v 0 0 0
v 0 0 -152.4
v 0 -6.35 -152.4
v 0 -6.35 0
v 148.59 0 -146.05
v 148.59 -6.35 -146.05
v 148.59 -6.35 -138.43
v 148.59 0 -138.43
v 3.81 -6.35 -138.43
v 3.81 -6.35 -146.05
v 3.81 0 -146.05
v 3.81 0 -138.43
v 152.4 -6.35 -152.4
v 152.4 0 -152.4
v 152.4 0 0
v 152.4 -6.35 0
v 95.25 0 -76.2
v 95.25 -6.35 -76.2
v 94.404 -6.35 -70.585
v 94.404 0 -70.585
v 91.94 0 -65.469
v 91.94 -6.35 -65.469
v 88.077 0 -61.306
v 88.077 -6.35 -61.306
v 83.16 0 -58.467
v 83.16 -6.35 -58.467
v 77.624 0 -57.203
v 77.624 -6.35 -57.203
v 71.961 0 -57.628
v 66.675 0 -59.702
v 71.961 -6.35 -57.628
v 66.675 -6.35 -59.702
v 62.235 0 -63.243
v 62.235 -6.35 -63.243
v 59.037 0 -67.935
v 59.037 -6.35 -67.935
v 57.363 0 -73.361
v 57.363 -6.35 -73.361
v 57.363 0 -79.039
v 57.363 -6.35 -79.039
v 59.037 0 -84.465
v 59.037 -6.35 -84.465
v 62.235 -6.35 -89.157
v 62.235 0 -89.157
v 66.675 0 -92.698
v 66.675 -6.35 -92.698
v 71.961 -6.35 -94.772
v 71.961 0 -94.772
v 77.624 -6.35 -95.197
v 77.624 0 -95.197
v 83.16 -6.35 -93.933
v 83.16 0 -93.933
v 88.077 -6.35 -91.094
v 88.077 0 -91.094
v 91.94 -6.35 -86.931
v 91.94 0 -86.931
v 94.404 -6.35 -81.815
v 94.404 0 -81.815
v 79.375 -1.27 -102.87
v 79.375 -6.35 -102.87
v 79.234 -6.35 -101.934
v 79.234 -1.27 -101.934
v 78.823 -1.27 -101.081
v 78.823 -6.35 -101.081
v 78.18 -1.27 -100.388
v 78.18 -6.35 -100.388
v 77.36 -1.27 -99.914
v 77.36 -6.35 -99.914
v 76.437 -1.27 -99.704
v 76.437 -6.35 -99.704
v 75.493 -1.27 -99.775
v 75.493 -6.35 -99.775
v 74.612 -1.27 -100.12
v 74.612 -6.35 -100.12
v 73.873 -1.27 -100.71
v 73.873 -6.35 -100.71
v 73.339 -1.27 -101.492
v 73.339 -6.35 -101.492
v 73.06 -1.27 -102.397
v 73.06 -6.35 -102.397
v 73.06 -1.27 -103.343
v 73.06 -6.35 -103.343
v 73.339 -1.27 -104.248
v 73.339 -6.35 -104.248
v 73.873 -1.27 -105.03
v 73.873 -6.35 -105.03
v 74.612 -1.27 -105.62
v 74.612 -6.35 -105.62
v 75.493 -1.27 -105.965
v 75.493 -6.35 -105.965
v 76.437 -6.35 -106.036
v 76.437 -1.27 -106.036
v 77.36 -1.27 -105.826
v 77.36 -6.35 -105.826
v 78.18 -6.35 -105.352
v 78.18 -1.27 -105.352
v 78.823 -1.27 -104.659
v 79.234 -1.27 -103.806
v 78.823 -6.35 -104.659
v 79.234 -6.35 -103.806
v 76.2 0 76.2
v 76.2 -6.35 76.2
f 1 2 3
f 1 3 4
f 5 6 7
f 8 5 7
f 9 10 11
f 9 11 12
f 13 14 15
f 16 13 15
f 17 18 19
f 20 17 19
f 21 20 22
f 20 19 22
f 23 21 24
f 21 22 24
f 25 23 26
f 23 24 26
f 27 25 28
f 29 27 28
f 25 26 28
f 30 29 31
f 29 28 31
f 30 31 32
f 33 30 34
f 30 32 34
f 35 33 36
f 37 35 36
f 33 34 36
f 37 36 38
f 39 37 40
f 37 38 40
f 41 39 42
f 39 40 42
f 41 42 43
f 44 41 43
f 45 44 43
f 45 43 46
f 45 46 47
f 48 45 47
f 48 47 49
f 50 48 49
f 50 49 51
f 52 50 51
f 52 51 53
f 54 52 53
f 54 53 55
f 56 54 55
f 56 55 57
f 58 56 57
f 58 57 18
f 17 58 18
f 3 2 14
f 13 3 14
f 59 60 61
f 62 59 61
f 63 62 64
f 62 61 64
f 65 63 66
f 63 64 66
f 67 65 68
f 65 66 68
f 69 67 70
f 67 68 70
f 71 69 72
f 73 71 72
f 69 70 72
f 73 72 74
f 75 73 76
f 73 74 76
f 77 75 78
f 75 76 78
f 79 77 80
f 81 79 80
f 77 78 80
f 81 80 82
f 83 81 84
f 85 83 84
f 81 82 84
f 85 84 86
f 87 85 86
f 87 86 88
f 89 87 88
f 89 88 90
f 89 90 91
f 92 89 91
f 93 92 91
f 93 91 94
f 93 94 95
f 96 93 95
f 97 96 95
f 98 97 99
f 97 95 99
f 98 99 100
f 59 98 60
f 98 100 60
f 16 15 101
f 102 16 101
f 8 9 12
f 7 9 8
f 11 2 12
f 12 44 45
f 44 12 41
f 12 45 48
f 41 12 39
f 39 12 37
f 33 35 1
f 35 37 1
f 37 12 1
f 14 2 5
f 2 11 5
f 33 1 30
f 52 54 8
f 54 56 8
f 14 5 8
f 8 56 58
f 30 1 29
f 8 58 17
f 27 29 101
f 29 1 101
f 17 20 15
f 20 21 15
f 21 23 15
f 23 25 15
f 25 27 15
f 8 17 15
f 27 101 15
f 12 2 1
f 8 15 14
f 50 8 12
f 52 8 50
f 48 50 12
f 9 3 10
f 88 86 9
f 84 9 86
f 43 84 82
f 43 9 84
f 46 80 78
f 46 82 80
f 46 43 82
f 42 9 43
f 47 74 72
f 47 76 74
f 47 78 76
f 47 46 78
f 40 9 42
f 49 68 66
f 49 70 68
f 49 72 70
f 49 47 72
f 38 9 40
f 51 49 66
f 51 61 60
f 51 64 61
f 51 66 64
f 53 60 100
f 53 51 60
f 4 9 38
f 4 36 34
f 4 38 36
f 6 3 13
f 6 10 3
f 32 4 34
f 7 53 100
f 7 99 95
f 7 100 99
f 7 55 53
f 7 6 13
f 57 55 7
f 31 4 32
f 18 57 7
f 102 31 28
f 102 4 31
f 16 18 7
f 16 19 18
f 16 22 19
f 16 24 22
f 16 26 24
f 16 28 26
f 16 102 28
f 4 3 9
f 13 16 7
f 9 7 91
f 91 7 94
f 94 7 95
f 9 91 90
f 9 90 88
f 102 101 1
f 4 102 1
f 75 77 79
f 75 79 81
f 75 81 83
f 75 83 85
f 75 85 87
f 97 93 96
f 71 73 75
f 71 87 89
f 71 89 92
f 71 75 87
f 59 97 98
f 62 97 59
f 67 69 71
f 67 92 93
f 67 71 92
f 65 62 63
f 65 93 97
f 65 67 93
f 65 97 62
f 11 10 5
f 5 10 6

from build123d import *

# Parameters (mm, degrees)
F0_W     = 152.4
F0_H     = 152.4
F1_DEPTH = 6.35
F2_R     = 19.05
F3_DEPTH = 6.351
F4_R     = 3.175
F5_DEPTH = 5.08
F6_W     = 144.78
F6_H     = 7.62
F7_DEPTH = 25.4


with BuildPart() as f1:
    # F0 (on Front) → F1 (new body)
    with BuildSketch(Plane.XZ):
        Polygon((76.2, 76.2), (0, 0), (152.4, 0), align=None)
        with Locations((76.2, -76.2)):
            Rectangle(F0_W, F0_H)
    extrude(amount=F1_DEPTH)

    # F2 (on face) → F3 (cut, through all)
    with BuildSketch(Plane.XZ.offset(6.35)):
        with Locations((76.2, -76.2)):
            Circle(F2_R)
    extrude(amount=-F3_DEPTH, mode=Mode.SUBTRACT)

    # F4 (on face) → F5 (cut)
    with BuildSketch(Plane.XZ.offset(6.35)):
        with Locations((76.2, -102.87)):
            Circle(F4_R)
    extrude(amount=-F5_DEPTH, mode=Mode.SUBTRACT)

    # F6 (on face) → F7 (cut)
    with BuildSketch(Plane.XZ.offset(6.35)):
        with Locations((76.2, -142.24)):
            Rectangle(F6_W, F6_H)
    extrude(amount=-F7_DEPTH, mode=Mode.SUBTRACT)


solid = f1.part
